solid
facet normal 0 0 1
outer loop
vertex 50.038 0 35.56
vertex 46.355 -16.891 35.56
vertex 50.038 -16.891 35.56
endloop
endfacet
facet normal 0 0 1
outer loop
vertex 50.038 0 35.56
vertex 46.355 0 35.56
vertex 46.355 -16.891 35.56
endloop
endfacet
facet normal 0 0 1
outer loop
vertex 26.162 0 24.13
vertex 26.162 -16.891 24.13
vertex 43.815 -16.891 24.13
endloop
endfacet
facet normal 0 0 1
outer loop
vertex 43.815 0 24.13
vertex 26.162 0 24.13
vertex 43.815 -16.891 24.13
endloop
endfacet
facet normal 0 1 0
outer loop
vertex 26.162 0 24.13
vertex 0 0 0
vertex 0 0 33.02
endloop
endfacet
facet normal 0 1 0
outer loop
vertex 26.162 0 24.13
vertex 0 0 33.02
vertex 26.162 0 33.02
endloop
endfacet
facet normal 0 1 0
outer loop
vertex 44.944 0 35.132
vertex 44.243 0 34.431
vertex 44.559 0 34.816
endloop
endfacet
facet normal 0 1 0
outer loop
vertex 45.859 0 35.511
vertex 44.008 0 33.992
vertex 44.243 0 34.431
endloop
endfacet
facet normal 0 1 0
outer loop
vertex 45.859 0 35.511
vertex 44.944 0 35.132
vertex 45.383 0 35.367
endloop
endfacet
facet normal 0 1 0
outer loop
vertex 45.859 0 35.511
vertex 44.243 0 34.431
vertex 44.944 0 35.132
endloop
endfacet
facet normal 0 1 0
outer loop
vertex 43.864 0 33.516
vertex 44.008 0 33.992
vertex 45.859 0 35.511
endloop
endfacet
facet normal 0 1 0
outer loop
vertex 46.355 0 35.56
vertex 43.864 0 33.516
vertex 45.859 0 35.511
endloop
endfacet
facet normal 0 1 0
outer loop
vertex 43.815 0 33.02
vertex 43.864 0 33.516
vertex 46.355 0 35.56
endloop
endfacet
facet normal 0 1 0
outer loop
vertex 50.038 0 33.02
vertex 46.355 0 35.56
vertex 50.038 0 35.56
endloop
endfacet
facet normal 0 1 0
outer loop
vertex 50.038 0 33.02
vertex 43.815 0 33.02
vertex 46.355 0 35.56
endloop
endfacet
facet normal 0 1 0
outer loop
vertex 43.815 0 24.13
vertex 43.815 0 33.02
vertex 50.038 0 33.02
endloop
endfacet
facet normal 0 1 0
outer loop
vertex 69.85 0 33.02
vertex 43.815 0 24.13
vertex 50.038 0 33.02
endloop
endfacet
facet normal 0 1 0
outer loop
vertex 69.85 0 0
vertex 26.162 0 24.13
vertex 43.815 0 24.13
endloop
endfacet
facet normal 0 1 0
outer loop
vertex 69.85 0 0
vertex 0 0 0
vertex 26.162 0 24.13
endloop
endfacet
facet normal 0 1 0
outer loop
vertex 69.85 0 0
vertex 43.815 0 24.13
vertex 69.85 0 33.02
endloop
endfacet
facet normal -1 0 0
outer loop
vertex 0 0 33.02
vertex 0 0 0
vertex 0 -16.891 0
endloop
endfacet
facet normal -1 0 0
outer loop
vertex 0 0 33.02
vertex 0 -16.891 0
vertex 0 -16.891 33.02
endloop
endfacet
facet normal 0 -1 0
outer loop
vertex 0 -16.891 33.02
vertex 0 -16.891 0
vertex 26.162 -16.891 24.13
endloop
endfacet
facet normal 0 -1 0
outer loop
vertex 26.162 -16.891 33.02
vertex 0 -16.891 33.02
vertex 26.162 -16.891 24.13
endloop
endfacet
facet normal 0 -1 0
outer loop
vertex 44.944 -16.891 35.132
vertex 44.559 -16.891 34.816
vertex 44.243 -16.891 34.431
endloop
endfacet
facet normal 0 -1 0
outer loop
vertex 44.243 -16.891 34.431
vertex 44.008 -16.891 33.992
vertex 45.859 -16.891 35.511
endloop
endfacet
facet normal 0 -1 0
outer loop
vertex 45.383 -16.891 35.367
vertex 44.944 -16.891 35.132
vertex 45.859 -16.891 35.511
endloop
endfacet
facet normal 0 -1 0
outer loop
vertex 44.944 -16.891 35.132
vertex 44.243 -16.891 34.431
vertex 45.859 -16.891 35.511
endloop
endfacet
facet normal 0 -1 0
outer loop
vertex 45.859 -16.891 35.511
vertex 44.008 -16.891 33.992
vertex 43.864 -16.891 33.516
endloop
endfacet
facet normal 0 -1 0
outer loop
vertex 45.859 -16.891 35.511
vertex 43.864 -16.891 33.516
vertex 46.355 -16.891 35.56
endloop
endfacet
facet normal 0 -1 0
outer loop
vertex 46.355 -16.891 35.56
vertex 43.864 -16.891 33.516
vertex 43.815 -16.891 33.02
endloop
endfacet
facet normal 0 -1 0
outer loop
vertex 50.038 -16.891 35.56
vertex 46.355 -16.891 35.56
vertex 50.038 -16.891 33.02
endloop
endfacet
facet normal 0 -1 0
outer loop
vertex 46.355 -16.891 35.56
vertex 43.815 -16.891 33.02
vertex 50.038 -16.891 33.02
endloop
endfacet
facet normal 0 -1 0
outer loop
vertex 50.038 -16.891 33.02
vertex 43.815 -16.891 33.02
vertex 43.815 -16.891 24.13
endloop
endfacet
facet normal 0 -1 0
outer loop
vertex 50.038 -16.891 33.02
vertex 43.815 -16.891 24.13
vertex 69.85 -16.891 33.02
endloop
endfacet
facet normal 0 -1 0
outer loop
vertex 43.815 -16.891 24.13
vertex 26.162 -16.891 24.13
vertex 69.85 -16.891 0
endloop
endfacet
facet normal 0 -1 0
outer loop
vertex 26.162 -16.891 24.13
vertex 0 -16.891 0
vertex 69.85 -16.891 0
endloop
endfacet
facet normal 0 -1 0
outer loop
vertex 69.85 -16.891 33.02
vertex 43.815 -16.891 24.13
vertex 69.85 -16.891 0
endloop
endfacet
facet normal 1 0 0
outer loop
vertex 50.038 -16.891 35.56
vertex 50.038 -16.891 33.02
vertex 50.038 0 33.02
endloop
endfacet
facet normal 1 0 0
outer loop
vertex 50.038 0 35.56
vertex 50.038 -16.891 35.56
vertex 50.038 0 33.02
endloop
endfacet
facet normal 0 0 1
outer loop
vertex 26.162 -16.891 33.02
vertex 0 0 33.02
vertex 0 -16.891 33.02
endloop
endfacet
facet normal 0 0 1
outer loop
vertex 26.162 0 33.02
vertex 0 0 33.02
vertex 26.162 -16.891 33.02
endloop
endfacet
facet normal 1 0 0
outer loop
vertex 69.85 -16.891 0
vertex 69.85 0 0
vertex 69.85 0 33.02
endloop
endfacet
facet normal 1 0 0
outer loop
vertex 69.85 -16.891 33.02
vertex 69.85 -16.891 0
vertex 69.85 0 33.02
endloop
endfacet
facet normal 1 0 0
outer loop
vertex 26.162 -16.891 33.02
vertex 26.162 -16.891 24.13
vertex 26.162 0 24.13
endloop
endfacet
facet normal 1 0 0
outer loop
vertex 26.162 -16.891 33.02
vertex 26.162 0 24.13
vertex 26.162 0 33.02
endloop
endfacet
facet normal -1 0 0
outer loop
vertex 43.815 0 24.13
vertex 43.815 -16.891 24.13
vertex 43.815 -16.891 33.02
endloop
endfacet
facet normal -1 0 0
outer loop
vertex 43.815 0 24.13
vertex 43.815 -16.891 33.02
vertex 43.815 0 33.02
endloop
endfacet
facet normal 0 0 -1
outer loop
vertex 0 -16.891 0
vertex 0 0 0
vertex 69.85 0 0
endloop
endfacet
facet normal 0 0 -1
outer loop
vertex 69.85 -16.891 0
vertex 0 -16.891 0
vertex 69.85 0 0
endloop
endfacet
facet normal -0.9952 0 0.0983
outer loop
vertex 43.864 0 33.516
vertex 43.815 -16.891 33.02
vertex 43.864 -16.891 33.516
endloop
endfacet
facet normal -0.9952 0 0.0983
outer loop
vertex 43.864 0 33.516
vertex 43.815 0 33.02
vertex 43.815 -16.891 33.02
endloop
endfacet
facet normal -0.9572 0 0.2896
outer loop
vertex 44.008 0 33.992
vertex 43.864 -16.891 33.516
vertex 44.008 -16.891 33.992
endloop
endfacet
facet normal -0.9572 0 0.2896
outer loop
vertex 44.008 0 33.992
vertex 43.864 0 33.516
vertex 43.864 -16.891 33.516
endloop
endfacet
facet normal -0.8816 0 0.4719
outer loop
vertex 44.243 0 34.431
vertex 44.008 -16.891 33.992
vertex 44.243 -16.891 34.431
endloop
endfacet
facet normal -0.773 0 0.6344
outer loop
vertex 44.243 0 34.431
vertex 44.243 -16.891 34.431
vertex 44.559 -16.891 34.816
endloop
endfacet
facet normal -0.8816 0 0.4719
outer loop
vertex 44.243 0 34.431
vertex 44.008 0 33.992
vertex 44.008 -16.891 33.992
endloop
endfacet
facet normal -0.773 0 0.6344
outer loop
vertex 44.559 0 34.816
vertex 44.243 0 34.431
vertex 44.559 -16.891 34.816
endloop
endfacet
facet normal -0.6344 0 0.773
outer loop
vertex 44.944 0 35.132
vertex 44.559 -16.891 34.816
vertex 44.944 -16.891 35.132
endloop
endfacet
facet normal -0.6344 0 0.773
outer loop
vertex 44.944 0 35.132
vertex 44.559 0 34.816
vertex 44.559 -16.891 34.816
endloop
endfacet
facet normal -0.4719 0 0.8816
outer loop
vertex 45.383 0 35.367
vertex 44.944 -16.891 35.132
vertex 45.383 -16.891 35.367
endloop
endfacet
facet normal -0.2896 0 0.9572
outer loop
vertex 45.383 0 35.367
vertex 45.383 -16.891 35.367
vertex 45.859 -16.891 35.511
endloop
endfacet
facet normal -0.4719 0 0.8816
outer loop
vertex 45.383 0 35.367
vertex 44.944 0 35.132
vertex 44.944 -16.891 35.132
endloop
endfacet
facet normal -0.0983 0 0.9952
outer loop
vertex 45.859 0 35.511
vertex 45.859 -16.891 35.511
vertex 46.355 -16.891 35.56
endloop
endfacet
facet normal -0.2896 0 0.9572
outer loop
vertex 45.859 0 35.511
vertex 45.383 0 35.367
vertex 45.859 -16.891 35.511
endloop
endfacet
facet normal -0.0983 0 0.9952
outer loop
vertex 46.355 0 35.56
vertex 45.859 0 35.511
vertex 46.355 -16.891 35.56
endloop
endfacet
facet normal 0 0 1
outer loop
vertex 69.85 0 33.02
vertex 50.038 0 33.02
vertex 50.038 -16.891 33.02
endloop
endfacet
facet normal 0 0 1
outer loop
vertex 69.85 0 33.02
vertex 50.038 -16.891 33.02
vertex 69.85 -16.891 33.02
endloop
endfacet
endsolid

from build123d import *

# Parameters (mm, degrees)
F0_W     = 69.85
F0_H     = 33.02
F1_DEPTH = 16.891
F2_W     = 17.653
F2_H     = 8.89
F3_DEPTH = 25.4
F4_W     = 6.223
F4_H     = 16.891
F5_DEPTH = 2.54
F6_R     = 2.54


with BuildPart() as f1:
    # F0 (on Front) → F1 (new body)
    with BuildSketch(Plane.XZ):
        with Locations((34.925, 16.51)):
            Rectangle(F0_W, F0_H)
    extrude(amount=F1_DEPTH)

    # F2 (on face) → F3 (cut)
    with BuildSketch(Plane.XZ.offset(16.891)):
        with Locations((34.9885, 28.575)):
            Rectangle(F2_W, F2_H)
    extrude(amount=-F3_DEPTH, mode=Mode.SUBTRACT)

    # F4 (on face) → F5 (join)
    with BuildSketch(Plane.XY.offset(33.02)):
        with Locations((46.9265, -8.4455)):
            Rectangle(F4_W, F4_H)
    extrude(amount=F5_DEPTH)

    # F6
    f6_edges = [f1.edges().sort_by_distance(p)[0] for p in [
        (43.815, -8.4455, 35.56),
    ]]
    fillet(f6_edges, radius=F6_R)


solid = f1.part
